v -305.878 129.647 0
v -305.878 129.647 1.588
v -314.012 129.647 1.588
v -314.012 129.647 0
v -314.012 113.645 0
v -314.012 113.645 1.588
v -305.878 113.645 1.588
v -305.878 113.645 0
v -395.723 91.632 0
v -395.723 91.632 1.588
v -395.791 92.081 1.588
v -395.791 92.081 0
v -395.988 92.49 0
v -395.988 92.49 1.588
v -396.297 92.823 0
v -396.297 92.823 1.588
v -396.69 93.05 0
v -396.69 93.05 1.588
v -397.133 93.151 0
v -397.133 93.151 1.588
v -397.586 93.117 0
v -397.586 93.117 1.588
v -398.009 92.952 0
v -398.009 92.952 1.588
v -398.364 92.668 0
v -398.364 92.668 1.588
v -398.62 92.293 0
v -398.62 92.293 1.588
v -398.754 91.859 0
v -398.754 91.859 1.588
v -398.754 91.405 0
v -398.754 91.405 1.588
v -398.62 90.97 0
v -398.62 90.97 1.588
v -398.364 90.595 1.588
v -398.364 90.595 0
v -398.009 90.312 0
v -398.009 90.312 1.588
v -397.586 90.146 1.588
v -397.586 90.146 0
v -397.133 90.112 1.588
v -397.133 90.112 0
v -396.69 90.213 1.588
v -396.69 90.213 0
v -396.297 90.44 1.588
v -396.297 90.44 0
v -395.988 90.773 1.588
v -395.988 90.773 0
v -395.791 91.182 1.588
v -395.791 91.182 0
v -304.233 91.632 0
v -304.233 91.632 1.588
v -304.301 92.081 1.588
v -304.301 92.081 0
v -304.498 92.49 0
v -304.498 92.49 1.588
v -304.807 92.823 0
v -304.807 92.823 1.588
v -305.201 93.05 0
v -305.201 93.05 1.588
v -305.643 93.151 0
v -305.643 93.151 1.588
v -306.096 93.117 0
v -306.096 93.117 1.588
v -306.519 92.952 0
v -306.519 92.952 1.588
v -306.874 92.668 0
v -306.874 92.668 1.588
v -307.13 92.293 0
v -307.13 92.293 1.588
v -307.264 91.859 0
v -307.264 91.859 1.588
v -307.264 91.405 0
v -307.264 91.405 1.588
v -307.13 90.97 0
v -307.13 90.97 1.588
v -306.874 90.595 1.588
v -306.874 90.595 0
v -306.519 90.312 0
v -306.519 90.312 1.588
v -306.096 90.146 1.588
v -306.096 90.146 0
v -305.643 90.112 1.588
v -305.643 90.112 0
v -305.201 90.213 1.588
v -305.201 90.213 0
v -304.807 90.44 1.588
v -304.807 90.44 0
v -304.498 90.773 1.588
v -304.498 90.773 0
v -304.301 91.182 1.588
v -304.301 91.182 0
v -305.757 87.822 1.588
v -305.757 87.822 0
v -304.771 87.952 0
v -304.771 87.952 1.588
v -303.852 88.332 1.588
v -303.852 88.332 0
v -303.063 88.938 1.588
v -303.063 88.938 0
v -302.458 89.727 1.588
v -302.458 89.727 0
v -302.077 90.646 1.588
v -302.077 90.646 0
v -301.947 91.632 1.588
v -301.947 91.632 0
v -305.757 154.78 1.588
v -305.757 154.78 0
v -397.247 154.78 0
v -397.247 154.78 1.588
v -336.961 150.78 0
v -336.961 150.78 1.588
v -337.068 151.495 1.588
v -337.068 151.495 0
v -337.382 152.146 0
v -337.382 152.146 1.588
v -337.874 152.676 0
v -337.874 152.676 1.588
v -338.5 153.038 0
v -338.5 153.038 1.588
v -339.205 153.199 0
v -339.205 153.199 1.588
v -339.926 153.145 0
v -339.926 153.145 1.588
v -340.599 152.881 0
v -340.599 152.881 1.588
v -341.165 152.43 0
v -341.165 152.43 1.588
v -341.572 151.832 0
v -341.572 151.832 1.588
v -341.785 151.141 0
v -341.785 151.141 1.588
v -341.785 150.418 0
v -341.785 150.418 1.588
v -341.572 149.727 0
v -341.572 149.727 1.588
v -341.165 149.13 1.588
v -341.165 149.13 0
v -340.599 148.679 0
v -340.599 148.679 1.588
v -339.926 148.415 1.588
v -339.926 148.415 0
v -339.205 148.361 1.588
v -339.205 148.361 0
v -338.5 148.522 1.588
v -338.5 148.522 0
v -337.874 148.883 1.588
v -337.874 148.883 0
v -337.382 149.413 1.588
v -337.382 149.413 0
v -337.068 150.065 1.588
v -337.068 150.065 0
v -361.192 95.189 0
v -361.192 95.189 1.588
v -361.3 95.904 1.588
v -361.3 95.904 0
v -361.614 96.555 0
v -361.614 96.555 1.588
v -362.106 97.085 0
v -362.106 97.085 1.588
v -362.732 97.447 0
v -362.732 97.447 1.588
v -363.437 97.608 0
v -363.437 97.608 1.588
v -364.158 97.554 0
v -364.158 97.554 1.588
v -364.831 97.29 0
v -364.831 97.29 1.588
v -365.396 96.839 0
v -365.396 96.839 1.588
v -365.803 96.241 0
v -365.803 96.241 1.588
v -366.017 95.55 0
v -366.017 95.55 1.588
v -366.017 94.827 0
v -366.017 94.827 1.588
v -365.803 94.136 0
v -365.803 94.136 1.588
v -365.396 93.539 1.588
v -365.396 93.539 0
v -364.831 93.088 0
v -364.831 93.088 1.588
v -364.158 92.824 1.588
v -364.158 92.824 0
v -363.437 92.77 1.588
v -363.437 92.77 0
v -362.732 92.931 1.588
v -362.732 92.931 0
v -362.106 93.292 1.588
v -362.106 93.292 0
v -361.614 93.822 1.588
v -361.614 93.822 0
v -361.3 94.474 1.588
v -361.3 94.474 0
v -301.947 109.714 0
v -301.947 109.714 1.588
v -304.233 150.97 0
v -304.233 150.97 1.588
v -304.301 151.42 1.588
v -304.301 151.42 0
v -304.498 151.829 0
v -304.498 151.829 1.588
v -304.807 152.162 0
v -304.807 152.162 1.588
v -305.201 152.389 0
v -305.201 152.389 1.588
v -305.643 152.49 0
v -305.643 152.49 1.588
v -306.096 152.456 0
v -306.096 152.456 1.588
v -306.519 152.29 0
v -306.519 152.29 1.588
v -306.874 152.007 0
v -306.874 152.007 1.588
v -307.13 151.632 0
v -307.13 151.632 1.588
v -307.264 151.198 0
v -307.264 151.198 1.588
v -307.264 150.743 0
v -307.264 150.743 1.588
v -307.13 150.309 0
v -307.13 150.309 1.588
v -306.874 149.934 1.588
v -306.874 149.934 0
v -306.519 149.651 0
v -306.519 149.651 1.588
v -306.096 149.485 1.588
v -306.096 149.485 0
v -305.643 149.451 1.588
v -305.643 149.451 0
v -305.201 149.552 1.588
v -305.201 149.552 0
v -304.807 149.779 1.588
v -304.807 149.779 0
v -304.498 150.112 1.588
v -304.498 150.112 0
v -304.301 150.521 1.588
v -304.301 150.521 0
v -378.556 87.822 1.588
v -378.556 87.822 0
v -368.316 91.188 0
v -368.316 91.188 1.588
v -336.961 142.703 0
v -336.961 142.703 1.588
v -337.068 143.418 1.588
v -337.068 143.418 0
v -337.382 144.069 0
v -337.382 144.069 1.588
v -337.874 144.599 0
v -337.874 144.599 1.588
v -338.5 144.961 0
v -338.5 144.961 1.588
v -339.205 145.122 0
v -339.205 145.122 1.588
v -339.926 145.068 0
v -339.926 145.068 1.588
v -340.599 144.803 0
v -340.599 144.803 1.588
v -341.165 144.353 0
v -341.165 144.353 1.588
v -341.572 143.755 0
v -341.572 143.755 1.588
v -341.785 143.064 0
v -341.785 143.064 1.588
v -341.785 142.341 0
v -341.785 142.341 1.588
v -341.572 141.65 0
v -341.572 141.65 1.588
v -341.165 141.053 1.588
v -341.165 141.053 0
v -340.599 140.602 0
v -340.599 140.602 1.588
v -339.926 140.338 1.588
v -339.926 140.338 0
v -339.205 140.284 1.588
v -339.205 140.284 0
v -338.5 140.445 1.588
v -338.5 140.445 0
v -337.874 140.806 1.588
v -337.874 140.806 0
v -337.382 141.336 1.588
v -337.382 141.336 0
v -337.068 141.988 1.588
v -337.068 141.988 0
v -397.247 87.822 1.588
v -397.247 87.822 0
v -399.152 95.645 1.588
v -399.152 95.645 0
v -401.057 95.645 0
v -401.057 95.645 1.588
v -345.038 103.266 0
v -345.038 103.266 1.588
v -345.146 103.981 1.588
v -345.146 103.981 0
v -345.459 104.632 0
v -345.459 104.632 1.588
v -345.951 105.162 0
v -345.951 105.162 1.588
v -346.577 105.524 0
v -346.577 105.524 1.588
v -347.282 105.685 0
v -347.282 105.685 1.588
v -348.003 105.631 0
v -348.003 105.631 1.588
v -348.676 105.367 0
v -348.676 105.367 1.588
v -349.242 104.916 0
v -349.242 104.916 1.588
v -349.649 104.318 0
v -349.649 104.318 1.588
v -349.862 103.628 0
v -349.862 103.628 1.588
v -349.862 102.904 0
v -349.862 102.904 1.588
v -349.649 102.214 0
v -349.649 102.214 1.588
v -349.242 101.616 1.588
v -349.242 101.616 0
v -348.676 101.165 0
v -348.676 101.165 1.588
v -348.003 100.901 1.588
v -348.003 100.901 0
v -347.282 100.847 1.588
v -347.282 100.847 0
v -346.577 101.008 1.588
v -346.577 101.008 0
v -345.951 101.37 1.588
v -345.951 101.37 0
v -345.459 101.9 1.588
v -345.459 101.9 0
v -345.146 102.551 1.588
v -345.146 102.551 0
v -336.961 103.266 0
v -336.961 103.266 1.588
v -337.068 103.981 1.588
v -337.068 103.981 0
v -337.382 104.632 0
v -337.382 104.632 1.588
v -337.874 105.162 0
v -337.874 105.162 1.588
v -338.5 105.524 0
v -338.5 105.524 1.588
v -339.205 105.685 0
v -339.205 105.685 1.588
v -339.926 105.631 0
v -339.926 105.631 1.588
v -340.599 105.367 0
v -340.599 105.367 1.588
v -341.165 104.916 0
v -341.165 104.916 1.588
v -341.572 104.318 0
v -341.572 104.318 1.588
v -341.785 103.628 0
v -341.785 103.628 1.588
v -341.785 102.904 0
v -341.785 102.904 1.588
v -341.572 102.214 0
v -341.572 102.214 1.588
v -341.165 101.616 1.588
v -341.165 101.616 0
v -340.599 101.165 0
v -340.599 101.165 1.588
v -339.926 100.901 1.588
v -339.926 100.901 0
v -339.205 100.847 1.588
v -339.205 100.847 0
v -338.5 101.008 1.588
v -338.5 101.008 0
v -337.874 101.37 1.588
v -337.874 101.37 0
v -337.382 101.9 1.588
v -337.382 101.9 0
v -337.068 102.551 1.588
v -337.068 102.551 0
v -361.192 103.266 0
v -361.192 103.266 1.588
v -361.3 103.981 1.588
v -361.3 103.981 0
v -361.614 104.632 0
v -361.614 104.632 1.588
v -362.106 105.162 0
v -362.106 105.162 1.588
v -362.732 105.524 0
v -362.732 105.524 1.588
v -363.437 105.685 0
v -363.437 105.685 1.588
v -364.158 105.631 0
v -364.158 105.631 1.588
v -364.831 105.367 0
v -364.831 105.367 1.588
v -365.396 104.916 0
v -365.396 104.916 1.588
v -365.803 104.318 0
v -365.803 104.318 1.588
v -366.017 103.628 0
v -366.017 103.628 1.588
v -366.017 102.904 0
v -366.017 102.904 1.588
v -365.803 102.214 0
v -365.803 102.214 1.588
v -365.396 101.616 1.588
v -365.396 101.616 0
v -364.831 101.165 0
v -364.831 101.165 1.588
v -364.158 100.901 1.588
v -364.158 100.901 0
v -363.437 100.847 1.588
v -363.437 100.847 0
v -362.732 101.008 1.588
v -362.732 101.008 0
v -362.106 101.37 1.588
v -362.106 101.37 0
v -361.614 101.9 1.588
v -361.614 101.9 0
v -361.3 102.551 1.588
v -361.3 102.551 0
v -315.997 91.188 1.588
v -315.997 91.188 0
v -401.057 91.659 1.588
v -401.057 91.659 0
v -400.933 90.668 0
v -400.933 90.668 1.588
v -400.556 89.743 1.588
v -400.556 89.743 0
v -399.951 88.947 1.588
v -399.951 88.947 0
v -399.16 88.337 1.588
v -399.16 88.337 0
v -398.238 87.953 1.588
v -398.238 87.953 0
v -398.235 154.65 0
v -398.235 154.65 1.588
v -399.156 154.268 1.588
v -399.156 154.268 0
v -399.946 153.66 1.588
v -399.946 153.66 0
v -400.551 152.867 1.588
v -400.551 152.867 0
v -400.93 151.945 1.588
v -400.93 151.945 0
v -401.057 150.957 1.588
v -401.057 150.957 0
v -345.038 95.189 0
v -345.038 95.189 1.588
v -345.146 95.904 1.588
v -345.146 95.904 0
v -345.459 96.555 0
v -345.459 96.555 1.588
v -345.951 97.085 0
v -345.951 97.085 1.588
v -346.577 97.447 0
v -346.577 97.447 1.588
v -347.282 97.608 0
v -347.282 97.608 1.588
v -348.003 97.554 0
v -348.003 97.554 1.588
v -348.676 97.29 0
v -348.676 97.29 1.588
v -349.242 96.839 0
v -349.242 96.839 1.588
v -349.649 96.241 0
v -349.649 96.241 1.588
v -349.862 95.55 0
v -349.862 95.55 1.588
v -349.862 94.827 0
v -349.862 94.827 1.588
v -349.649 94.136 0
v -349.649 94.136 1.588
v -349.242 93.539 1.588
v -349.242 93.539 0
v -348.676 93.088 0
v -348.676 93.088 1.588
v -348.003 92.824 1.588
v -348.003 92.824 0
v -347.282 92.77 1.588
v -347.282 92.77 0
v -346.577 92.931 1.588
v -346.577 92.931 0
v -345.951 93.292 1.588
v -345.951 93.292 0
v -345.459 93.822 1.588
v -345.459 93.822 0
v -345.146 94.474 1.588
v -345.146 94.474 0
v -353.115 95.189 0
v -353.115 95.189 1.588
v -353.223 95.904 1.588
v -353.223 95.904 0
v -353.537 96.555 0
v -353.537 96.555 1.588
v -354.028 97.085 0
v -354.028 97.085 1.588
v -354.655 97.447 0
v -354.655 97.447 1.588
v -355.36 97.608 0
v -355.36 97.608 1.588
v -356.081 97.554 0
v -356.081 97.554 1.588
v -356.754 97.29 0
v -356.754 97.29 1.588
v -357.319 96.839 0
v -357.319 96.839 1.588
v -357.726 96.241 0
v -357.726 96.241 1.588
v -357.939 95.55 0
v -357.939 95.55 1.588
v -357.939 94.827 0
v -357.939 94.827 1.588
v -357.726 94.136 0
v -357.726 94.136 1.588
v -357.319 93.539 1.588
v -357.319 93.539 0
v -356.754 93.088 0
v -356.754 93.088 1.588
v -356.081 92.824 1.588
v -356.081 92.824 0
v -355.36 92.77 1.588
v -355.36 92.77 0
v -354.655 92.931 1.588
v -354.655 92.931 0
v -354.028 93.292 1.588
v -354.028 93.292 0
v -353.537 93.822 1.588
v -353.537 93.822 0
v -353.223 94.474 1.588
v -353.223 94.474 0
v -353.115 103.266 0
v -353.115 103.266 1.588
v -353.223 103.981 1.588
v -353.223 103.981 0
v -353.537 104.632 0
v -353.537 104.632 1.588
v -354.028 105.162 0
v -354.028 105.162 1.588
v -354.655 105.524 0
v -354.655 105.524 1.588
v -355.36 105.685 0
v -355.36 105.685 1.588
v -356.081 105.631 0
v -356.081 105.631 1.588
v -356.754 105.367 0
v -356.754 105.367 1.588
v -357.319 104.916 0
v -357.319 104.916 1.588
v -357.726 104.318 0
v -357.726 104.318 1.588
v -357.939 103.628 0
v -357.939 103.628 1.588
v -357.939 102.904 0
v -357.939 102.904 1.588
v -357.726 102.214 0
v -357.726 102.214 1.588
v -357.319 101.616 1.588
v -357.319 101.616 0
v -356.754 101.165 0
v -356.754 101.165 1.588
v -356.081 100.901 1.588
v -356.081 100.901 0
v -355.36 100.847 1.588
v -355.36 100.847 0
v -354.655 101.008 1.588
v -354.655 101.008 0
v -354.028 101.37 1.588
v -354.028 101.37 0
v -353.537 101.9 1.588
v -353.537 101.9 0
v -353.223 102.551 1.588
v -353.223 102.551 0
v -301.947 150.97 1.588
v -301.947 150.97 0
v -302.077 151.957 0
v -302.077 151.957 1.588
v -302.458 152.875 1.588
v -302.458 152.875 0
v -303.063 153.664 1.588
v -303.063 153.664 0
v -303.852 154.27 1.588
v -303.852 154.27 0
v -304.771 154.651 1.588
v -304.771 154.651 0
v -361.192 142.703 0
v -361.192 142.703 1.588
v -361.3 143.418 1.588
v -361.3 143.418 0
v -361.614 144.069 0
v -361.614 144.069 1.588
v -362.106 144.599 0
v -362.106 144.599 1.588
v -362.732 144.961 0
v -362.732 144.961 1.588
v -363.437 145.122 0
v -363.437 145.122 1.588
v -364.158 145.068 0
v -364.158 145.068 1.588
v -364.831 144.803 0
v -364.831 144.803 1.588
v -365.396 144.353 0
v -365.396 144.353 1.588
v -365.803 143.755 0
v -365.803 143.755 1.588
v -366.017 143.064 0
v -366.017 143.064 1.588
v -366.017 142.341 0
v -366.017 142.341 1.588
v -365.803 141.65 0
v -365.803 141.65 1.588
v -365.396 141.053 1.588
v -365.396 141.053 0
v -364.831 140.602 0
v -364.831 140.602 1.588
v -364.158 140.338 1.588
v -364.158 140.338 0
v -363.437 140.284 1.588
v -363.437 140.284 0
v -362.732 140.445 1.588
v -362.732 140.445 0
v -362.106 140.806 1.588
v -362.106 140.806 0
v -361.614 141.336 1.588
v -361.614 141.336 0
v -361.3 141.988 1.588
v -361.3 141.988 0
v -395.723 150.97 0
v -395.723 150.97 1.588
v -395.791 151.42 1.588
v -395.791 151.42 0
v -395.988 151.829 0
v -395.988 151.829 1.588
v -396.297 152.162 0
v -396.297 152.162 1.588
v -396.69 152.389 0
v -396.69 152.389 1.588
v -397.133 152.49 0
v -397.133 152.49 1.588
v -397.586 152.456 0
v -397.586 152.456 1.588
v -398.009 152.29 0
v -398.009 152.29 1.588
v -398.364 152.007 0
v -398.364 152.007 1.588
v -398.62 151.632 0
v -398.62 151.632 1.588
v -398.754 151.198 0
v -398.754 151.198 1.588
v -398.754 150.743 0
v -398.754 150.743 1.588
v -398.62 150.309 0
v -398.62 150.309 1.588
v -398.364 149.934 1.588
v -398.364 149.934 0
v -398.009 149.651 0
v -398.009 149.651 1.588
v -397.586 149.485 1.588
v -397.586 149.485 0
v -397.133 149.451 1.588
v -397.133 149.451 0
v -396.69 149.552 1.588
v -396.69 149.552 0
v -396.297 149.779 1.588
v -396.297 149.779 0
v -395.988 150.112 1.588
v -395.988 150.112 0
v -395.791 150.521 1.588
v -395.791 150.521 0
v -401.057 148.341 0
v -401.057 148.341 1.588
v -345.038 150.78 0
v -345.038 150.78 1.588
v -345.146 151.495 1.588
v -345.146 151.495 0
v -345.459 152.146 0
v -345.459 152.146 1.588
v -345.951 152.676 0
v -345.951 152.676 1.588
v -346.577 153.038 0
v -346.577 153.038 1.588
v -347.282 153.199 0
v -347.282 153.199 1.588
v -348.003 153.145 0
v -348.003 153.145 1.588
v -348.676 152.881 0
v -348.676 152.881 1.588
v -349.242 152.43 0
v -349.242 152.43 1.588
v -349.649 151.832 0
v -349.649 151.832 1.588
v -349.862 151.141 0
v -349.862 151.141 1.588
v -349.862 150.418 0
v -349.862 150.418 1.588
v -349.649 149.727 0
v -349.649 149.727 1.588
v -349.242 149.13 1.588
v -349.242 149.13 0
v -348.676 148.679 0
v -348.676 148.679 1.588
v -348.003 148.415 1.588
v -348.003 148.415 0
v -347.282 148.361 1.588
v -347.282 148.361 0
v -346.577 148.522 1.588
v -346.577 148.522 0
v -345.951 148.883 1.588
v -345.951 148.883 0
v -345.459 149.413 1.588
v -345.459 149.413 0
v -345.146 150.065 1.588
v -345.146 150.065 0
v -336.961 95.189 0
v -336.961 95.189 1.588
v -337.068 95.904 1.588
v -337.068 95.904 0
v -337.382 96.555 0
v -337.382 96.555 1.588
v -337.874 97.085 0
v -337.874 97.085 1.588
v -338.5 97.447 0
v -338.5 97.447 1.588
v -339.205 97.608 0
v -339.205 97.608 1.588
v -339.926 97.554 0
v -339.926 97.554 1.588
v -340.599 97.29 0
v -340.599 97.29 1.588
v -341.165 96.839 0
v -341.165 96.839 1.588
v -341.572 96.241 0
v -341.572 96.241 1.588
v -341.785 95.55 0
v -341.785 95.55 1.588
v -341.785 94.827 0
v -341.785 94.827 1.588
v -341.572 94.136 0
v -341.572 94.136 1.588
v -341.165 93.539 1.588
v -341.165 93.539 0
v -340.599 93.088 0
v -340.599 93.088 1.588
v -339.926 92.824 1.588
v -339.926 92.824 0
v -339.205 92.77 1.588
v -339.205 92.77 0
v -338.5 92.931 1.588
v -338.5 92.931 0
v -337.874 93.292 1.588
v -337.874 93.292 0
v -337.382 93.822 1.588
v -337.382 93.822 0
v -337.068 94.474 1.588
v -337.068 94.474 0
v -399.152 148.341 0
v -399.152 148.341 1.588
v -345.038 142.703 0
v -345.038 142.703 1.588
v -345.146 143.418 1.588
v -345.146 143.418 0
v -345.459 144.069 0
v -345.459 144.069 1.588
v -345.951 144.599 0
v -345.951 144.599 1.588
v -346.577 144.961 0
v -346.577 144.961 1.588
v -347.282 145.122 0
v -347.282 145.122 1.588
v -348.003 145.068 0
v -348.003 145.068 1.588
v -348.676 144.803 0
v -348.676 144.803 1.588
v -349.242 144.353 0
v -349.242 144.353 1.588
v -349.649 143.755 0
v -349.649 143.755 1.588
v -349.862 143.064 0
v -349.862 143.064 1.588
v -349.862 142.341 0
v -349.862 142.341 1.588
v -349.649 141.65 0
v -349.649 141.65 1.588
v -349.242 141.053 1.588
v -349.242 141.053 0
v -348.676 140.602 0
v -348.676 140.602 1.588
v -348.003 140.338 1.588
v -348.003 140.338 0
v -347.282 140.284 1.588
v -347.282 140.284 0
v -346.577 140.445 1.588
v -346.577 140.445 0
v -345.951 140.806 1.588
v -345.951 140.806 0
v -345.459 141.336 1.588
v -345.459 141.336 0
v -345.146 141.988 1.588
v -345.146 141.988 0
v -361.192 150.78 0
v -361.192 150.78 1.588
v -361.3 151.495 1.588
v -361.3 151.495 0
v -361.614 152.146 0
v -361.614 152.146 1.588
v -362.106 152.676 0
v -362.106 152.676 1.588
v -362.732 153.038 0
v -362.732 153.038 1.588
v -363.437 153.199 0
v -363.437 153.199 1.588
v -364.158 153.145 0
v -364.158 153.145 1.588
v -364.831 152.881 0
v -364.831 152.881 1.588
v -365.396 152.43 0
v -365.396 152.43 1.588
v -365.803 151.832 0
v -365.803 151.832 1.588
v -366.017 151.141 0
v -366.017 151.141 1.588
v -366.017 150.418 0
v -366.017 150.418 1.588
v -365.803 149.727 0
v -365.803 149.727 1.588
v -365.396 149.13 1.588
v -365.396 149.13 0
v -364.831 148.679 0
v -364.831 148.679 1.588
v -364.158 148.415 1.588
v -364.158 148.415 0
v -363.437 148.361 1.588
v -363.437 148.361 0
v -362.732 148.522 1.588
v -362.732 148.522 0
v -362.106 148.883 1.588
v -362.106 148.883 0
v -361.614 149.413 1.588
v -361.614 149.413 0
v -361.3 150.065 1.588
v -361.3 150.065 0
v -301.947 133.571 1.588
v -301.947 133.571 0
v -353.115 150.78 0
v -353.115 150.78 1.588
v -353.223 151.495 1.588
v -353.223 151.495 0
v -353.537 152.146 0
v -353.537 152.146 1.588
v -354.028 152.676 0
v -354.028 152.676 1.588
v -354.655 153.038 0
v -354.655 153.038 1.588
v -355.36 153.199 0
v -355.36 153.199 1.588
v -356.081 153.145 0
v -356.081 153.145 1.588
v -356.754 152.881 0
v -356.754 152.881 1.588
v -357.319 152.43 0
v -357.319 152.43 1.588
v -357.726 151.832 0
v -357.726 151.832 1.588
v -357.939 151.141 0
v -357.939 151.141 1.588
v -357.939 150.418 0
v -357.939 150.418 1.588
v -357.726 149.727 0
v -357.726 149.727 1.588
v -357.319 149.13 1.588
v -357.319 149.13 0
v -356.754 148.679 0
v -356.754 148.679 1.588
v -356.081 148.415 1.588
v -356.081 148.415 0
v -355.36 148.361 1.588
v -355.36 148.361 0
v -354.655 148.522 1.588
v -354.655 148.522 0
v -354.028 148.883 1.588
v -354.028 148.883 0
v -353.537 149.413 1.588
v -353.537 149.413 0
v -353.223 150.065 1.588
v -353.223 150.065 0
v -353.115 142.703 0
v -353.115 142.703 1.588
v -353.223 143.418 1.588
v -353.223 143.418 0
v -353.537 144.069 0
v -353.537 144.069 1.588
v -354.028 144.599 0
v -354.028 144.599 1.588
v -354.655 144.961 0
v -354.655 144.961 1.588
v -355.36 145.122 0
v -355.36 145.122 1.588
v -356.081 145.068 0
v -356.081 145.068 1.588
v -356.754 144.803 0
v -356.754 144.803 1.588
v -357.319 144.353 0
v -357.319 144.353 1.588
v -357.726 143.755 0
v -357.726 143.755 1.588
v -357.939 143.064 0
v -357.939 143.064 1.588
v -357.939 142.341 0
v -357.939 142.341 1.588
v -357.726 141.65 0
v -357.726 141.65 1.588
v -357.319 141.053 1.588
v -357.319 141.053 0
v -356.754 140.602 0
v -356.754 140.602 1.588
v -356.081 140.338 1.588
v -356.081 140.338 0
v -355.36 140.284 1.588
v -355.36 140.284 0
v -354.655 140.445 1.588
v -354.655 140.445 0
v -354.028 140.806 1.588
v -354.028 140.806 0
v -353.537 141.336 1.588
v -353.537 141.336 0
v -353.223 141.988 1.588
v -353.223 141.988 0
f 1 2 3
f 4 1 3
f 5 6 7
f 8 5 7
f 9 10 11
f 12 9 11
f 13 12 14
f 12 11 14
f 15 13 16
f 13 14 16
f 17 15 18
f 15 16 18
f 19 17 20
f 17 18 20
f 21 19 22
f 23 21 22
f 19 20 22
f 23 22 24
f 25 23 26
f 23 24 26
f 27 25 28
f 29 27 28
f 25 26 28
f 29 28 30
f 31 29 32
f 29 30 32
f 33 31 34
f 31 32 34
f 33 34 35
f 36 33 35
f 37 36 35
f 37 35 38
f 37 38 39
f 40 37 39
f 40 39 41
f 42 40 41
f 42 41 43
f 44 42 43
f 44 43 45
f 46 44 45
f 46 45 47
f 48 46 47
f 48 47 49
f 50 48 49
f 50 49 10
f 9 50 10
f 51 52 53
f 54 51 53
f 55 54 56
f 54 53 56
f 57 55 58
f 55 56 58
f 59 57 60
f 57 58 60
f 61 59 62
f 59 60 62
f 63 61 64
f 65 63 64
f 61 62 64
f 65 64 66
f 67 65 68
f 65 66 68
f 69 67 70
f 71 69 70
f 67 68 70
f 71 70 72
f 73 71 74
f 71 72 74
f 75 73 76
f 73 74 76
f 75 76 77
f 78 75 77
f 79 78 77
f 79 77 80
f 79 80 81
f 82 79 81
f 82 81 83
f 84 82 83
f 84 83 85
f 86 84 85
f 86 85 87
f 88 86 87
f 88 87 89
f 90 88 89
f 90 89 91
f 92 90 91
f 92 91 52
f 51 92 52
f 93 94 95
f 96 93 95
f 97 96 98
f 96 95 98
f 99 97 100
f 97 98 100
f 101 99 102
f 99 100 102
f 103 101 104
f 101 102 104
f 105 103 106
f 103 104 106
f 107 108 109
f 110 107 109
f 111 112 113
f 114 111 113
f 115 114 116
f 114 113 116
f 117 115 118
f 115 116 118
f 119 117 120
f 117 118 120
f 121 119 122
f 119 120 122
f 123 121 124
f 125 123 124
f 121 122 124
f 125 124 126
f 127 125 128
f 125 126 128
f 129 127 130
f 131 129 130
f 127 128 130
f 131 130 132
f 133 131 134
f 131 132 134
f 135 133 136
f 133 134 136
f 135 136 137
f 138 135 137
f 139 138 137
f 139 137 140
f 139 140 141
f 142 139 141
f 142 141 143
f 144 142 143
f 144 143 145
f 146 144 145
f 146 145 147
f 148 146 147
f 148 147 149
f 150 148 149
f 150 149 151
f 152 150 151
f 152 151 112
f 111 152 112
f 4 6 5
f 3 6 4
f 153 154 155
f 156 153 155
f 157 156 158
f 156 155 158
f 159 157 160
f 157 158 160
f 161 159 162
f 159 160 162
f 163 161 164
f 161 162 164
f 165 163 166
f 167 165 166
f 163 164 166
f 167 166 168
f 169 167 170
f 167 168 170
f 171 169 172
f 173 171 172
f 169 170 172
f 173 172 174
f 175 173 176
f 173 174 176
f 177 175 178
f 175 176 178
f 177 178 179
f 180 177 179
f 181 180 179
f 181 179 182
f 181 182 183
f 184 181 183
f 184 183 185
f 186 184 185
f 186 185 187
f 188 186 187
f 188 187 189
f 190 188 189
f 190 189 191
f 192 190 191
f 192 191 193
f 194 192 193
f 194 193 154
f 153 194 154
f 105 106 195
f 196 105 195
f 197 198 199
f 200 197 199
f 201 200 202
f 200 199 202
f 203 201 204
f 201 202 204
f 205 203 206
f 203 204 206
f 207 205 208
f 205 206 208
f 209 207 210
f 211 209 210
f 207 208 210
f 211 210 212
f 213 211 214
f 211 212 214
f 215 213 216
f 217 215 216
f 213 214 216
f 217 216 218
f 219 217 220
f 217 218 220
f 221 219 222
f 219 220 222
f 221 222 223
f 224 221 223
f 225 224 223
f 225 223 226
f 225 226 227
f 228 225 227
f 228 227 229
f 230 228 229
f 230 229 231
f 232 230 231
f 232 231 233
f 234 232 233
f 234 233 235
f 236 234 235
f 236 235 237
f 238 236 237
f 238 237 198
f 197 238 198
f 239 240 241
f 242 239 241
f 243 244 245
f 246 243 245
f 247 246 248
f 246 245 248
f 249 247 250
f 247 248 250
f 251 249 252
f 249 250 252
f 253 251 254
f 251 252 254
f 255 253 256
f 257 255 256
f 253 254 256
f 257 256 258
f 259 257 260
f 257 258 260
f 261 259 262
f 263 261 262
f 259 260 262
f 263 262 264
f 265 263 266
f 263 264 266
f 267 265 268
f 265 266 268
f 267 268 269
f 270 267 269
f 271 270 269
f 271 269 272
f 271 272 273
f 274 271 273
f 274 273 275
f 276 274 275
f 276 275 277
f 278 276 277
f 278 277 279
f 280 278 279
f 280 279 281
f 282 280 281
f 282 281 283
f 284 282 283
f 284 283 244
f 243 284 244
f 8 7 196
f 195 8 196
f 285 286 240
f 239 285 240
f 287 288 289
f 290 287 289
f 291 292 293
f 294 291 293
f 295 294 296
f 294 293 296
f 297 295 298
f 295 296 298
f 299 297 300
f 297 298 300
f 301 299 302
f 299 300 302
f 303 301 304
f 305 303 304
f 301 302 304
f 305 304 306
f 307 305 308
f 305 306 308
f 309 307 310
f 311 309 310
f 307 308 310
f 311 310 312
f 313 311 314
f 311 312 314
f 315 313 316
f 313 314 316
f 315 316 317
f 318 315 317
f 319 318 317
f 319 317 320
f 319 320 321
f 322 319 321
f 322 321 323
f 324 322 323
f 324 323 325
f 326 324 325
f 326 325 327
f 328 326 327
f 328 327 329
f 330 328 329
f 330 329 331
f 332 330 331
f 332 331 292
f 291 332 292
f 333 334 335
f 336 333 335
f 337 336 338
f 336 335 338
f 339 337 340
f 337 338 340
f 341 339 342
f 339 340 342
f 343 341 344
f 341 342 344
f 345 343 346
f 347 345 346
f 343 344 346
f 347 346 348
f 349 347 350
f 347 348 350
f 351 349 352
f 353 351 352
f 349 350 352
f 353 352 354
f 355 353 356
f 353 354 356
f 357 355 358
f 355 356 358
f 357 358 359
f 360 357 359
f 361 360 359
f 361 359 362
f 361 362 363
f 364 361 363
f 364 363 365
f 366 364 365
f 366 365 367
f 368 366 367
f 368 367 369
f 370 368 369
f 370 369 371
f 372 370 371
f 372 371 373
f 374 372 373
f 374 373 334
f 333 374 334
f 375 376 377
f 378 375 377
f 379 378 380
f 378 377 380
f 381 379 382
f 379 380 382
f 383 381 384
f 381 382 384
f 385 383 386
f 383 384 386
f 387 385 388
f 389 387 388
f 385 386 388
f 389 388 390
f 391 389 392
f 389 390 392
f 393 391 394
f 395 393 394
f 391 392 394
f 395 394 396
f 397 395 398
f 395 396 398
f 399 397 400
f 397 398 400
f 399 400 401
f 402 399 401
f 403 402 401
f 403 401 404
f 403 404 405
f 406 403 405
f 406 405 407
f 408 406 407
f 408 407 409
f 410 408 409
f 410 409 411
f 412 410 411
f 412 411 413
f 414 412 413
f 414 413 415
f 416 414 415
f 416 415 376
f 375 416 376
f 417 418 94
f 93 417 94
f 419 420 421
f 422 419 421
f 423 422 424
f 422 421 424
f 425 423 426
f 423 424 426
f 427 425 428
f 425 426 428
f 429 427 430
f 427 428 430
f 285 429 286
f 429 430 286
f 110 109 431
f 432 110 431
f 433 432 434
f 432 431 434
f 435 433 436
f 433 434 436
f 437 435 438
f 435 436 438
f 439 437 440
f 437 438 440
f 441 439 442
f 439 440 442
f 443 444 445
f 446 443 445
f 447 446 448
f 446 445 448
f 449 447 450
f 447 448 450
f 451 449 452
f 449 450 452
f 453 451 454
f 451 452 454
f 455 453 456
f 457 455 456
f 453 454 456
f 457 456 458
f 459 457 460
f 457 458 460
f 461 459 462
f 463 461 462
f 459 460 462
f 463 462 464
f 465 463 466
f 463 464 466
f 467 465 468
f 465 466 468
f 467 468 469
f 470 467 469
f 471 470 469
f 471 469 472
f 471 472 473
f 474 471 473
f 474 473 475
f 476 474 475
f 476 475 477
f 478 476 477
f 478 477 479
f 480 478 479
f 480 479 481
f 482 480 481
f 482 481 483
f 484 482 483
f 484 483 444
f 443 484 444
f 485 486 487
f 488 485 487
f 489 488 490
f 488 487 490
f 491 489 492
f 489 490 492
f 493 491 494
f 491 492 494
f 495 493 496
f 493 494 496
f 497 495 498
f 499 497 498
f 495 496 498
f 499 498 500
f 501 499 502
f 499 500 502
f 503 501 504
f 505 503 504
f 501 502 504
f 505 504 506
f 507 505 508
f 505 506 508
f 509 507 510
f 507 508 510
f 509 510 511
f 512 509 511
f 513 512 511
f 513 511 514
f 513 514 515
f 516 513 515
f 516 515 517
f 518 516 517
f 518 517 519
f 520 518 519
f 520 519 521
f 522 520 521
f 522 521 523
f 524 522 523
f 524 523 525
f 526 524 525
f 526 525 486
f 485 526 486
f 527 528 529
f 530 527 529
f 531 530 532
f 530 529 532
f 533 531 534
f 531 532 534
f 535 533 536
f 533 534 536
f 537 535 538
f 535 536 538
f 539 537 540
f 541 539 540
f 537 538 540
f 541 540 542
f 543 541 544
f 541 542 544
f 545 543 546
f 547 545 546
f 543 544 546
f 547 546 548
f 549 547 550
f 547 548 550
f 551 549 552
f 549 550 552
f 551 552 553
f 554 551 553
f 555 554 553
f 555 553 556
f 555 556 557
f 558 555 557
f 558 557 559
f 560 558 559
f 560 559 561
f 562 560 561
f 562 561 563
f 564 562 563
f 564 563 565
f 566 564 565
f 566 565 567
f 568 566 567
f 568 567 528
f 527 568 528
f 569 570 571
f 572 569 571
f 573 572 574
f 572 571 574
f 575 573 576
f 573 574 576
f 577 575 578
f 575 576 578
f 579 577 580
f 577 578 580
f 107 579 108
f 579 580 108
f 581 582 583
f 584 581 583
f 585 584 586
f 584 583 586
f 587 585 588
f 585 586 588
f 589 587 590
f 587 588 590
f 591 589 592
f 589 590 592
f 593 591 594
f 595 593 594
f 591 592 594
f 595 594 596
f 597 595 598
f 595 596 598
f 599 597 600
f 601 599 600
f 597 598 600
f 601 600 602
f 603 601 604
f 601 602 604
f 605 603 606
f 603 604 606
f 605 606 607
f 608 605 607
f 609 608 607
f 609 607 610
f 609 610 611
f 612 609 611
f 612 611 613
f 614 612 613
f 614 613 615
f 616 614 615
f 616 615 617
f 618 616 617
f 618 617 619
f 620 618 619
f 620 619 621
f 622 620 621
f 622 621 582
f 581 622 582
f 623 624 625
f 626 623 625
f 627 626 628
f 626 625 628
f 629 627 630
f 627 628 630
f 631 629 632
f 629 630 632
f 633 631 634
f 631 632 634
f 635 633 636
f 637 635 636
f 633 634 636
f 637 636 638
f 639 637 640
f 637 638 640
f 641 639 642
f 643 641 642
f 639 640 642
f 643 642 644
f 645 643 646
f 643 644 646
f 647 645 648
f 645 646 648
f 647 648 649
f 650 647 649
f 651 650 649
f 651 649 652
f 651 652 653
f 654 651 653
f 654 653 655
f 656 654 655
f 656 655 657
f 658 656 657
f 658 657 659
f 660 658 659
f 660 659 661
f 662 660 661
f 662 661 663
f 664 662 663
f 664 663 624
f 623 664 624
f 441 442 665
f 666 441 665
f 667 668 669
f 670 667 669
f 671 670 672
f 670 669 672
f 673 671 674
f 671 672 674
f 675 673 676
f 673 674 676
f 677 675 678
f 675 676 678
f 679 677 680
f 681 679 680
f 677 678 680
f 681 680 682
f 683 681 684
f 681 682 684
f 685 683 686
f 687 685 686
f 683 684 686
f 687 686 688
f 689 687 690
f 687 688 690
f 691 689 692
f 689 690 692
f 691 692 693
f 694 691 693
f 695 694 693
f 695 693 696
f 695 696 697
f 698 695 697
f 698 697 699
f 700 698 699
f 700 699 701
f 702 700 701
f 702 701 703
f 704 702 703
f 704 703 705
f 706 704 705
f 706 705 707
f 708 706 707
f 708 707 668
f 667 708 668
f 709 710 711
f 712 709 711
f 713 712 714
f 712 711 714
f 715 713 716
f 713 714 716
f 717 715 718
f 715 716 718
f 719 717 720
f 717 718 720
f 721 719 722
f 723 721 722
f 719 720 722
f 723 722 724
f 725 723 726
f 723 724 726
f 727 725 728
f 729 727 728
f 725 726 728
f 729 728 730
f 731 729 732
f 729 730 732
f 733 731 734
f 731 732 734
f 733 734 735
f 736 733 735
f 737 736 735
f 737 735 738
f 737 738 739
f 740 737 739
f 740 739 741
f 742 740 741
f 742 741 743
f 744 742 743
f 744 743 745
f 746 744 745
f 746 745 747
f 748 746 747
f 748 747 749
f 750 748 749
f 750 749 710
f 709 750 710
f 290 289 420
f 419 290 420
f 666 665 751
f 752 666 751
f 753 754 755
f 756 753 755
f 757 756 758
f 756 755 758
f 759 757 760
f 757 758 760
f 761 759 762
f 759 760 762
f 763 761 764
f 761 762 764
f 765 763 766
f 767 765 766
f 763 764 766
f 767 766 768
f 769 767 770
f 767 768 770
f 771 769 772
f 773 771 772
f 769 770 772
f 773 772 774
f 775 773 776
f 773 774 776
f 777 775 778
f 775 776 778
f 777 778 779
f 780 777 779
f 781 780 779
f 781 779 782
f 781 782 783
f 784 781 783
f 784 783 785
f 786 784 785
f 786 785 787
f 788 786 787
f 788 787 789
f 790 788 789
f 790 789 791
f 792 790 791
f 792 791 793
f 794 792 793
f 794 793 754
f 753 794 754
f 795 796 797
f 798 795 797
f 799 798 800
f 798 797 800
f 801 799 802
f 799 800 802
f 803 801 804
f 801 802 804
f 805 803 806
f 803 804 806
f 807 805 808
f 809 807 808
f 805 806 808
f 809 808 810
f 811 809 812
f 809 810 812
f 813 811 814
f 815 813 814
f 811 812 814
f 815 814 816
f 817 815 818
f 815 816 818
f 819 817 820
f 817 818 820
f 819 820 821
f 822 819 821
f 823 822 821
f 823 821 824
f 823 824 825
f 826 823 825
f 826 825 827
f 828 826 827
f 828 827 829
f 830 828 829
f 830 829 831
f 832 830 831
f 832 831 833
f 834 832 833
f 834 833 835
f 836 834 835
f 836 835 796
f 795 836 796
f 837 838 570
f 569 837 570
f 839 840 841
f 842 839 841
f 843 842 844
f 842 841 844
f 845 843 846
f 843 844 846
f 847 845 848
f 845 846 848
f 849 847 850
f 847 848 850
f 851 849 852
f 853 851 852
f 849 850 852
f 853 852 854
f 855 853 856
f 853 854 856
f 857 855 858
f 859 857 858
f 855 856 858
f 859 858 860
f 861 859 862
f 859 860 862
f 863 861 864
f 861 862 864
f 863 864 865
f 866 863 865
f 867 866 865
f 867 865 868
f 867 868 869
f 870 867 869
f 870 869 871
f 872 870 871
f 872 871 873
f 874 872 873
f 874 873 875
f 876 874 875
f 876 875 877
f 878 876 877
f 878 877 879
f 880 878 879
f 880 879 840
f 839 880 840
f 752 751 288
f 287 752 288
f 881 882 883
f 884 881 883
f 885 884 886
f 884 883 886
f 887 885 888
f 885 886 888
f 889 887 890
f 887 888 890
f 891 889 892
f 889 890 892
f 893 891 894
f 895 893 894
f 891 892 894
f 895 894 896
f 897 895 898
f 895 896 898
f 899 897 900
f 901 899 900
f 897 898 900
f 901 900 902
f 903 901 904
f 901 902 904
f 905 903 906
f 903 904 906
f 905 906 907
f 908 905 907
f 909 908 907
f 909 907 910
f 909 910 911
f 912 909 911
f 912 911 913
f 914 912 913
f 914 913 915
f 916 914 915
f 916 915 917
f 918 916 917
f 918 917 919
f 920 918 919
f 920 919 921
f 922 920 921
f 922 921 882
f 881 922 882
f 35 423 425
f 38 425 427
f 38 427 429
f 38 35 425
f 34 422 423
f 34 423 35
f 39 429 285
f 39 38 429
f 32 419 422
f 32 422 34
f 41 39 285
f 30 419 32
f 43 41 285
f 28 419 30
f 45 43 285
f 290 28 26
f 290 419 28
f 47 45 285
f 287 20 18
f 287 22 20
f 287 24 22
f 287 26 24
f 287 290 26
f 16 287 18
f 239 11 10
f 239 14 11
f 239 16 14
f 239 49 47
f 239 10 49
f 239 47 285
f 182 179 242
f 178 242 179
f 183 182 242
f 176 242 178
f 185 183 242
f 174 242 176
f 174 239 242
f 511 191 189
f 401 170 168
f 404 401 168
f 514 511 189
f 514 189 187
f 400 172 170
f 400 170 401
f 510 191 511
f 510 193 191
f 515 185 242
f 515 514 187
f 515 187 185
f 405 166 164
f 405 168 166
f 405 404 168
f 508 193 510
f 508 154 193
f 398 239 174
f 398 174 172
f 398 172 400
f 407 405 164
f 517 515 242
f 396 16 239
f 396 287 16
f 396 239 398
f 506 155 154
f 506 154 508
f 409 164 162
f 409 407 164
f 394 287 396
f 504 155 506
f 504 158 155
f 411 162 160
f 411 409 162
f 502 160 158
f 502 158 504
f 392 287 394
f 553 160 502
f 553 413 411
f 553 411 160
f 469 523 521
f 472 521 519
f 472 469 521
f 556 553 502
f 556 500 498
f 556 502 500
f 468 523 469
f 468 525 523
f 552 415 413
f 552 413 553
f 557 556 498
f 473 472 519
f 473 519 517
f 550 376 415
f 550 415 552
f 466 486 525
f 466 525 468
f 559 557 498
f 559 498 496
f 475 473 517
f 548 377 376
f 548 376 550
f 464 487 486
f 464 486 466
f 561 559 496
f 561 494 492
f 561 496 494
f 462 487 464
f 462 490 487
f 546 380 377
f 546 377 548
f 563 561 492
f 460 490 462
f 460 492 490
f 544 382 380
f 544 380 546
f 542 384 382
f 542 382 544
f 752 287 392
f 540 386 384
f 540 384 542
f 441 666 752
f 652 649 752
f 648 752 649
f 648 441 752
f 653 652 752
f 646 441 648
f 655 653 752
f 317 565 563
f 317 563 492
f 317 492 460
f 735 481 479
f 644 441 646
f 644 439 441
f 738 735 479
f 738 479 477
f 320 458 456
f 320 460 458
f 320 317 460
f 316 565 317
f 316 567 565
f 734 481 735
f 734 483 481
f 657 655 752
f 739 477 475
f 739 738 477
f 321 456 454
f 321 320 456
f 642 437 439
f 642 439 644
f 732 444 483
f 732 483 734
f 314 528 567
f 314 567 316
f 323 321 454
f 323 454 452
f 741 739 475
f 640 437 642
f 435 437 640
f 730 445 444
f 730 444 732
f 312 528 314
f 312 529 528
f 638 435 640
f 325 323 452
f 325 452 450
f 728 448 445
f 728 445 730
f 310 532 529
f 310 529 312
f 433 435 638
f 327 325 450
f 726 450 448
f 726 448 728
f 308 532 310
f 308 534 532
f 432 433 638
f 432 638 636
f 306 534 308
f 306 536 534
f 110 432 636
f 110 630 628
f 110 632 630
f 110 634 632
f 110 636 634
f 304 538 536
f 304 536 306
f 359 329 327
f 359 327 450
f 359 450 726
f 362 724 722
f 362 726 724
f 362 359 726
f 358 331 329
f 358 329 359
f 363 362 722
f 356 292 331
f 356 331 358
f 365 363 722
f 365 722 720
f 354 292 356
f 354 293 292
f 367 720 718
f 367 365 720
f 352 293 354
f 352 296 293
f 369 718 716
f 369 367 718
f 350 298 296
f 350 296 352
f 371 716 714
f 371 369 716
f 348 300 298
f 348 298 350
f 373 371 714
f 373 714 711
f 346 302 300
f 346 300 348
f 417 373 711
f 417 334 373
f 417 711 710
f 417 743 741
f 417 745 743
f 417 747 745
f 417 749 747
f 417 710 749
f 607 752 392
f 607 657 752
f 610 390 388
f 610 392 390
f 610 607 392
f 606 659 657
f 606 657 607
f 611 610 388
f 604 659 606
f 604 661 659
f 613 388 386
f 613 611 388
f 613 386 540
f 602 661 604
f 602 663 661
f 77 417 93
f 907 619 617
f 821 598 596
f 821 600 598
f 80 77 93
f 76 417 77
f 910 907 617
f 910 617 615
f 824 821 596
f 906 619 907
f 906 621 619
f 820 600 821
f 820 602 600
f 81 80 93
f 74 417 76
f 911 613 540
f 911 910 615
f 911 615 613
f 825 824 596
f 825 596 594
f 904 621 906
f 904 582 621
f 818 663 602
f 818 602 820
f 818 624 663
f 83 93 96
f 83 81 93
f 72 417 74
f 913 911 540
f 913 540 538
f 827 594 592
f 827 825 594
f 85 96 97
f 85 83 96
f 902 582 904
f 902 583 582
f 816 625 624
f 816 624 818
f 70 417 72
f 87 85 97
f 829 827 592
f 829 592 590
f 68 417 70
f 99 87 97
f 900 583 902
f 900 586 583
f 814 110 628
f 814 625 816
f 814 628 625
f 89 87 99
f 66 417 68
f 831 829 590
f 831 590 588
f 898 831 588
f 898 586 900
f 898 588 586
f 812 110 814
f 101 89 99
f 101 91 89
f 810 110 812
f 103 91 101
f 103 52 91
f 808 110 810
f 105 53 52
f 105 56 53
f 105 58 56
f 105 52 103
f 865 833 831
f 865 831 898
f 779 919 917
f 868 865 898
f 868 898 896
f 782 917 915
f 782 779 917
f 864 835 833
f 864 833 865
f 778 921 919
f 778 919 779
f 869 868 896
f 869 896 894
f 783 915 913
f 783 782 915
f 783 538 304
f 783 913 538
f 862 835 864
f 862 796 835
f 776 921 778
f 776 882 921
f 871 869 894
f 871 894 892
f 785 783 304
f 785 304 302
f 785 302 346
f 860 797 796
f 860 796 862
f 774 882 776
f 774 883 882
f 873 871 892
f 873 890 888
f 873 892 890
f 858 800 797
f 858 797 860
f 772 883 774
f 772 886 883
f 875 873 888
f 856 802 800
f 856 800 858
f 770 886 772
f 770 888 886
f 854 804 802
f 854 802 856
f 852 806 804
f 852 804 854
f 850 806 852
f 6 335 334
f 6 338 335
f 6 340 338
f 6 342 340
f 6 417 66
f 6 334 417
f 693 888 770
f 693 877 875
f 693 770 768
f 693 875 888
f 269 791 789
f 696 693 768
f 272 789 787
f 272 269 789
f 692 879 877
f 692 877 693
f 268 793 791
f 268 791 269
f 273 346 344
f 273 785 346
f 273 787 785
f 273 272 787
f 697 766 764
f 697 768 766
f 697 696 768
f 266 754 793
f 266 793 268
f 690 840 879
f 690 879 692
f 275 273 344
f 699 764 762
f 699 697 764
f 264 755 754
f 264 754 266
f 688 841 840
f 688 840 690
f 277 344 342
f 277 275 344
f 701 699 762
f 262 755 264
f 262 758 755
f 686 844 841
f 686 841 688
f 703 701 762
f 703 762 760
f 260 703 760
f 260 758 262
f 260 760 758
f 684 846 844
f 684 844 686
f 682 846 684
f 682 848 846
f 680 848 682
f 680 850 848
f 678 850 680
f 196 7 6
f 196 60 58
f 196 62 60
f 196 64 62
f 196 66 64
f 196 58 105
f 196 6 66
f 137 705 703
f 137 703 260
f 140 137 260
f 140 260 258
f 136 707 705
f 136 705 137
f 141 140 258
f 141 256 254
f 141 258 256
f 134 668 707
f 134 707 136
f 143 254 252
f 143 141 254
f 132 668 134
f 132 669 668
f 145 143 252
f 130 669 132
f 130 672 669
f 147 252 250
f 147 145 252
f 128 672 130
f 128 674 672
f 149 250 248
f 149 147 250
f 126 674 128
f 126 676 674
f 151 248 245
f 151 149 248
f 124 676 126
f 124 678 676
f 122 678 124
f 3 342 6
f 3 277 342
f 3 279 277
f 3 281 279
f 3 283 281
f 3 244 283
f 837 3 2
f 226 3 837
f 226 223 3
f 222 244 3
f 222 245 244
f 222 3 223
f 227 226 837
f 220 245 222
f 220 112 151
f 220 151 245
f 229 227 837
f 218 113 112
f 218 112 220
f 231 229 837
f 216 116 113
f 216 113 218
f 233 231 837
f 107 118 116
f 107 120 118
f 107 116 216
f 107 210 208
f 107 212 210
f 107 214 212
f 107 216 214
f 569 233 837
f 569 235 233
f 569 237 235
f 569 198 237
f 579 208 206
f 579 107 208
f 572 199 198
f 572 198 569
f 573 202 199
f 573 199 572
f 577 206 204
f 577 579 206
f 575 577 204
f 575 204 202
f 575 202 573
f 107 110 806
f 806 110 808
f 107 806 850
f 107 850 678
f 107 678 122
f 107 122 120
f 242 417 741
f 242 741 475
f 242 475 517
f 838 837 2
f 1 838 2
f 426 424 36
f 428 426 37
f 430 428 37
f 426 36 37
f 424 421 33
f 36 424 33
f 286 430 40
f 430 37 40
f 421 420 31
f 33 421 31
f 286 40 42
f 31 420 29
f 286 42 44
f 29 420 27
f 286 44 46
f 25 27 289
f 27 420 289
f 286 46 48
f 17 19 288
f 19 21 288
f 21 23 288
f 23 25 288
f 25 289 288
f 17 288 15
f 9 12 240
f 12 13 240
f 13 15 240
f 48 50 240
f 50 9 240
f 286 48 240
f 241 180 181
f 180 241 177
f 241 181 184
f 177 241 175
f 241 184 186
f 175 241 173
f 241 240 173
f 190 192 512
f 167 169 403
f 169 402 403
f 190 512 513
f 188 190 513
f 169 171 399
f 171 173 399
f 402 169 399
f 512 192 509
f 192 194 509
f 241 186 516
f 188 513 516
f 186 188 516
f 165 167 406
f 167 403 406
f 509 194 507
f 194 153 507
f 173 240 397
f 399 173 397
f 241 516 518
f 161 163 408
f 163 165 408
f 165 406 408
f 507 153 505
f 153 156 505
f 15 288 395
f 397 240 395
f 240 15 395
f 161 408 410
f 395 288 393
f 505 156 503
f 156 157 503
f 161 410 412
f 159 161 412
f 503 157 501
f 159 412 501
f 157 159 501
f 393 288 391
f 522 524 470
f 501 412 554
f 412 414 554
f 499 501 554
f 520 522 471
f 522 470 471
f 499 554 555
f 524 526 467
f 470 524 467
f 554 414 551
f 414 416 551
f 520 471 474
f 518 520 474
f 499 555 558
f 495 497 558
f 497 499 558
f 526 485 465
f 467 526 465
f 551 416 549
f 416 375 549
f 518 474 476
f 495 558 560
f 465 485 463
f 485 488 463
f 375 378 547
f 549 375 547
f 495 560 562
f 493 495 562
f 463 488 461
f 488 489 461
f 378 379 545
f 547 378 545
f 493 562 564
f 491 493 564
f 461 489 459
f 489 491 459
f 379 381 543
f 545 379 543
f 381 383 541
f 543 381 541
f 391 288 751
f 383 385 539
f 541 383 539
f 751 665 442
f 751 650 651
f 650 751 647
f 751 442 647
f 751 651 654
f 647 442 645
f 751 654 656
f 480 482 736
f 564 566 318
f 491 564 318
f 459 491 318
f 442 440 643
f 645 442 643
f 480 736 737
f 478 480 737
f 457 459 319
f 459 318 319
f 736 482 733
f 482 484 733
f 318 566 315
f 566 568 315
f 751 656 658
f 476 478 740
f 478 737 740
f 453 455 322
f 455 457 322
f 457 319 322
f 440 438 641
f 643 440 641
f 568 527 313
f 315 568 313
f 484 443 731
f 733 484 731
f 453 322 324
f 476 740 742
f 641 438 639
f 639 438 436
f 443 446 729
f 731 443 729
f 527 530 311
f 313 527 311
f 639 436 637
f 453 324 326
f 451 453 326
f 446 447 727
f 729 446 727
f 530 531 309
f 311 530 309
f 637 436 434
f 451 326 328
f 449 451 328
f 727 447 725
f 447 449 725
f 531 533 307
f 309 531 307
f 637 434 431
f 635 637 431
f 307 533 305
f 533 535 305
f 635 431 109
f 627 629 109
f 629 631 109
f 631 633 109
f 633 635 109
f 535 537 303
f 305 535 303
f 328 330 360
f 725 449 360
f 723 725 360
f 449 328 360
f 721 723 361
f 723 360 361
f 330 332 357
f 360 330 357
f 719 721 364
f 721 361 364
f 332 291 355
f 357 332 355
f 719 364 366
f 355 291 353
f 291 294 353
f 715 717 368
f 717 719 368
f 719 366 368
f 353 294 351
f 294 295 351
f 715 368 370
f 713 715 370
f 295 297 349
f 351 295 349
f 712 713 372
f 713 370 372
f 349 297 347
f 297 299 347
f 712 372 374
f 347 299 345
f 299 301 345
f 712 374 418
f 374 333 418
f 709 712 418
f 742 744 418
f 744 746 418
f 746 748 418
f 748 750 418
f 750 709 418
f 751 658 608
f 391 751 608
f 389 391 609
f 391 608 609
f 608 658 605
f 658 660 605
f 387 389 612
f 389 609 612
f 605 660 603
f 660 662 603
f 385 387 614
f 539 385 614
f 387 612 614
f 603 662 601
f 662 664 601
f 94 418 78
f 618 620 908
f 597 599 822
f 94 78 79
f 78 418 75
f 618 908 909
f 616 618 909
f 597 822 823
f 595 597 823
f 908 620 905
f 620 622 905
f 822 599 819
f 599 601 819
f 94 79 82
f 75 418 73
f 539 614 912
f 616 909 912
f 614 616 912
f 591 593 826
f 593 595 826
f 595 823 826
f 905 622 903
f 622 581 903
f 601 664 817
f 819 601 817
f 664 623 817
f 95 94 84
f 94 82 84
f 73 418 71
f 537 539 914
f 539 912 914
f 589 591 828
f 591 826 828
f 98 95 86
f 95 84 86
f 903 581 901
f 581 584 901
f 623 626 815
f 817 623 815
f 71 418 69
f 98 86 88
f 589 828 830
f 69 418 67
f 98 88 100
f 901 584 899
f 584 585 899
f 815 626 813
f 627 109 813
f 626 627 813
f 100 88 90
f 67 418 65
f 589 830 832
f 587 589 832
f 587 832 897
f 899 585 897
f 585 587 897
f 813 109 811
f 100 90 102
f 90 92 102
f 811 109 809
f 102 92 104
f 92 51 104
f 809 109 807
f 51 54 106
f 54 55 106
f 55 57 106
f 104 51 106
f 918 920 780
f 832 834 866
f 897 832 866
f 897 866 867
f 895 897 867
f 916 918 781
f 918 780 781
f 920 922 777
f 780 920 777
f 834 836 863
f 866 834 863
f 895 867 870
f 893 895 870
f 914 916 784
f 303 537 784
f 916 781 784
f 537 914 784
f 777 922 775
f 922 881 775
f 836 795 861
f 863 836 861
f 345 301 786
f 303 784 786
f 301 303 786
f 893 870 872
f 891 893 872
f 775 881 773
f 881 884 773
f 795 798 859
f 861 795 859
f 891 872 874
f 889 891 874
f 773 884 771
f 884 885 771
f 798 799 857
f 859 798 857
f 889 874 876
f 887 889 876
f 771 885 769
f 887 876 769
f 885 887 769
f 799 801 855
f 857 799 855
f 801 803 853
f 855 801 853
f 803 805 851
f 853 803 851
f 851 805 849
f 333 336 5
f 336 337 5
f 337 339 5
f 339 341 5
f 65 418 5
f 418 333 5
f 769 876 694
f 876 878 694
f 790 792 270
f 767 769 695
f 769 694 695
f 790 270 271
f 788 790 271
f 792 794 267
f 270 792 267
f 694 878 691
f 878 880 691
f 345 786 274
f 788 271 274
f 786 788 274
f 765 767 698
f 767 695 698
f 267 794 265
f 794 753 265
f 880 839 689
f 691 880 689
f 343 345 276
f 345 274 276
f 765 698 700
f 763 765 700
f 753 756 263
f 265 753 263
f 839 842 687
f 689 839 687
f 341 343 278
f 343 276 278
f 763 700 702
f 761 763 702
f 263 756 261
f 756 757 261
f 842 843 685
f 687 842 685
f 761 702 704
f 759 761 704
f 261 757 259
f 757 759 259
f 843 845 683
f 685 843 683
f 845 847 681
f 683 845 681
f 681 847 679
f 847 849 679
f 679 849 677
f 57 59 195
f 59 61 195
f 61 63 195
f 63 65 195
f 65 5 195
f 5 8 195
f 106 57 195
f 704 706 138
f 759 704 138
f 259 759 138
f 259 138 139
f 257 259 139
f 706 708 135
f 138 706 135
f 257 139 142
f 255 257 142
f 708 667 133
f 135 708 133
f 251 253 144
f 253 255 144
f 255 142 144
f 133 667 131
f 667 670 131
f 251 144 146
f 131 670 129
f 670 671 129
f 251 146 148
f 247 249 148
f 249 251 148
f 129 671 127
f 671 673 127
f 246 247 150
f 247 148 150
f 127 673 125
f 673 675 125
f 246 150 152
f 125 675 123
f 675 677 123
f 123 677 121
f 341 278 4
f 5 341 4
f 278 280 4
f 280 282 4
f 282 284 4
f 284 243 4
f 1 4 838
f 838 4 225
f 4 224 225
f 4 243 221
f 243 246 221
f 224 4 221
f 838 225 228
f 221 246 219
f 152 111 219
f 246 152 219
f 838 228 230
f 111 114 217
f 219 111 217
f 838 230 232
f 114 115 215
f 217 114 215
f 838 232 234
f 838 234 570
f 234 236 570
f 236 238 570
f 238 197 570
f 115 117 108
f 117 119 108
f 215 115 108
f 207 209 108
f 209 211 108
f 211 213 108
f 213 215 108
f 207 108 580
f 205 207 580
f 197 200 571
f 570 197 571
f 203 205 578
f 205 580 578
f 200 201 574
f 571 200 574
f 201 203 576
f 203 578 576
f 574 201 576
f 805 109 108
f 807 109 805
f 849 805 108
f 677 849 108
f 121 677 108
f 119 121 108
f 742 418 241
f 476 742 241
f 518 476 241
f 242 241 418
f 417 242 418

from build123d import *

# Parameters (mm, degrees)
SKETCH1_R           = 1.355900406
BOSS_EXTRUDE1_DEPTH = 1.5875
SKETCH3_R           = 1.524
CUT_EXTRUDE1_DEPTH  = 2.5875
SKETCH5_W           = 2.0955
SKETCH5_H           = 13.208
BOSS_EXTRUDE3_DEPTH = 1.5875
CUT_EXTRUDE2_DEPTH  = 2.5875
SKETCH8_R           = 2.4257
CUT_EXTRUDE3_DEPTH  = 2.5875


with BuildPart() as part:
    # Sketch1 → Boss-Extrude1 (new body)
    with BuildSketch(Plane.XY):
        with BuildLine():
            Line((-301.9473, 111.74645), (-305.87795, 115.6771))
            Line((-305.87795, 115.6771), (-316.1078, 115.6771))
            Line((-316.1078, 115.6771), (-316.1078, 128.8851))
            Line((-316.1078, 128.8851), (-305.87795, 128.8851))
            Line((-305.87795, 128.8851), (-301.9473, 132.81575))
            Line((-301.9473, 132.81575), (-301.9473, 150.9704))
            ThreePointArc((-301.9473, 150.9704), (-303.063223164, 153.664476836), (-305.7573, 154.7804))
            Line((-305.7573, 154.7804), (-397.247125, 154.7804))
            ThreePointArc((-397.247125, 154.7804), (-399.946077222, 153.659592612), (-401.0571, 150.956597849))
            Line((-401.0571, 150.956597849), (-401.0571, 148.341))
            Line((-401.0571, 148.341), (-399.1521, 148.341))
            Line((-399.1521, 148.341), (-399.1521, 95.6449))
            Line((-399.1521, 95.6449), (-401.0571, 95.6449))
            Line((-401.0571, 95.6449), (-401.0571, 91.659304166))
            ThreePointArc((-401.0571, 91.659304166), (-399.951018769, 88.947400452), (-397.2472, 87.8217))
            Line((-397.2472, 87.8217), (-378.5565, 87.8217))
            Line((-378.5565, 87.8217), (-368.3165, 91.1883))
            Line((-368.3165, 91.1883), (-315.9973, 91.1883))
            Line((-315.9973, 91.1883), (-305.7573, 87.8217))
            ThreePointArc((-305.7573, 87.8217), (-303.063223164, 88.937623164), (-301.9473, 91.6317))
            Line((-301.9473, 91.6317), (-301.9473, 111.74645))
        make_face()
        with Locations((-305.7573, 91.6317)):
            Circle(SKETCH1_R, mode=Mode.SUBTRACT)
        with Locations((-305.7573, 150.9704)):
            Circle(SKETCH1_R, mode=Mode.SUBTRACT)
        with Locations((-397.247125, 150.9704)):
            Circle(SKETCH1_R, mode=Mode.SUBTRACT)
        with Locations((-397.2472, 91.6317)):
            Circle(SKETCH1_R, mode=Mode.SUBTRACT)
    extrude(amount=BOSS_EXTRUDE1_DEPTH)

    # Sketch3 → Cut-Extrude1 (cut, through all)
    with BuildSketch(Plane.XY.offset(1.5875)):
        with Locations((-397.247125, 150.9704)):
            Circle(SKETCH3_R)
        with Locations((-305.7573, 150.9704)):
            Circle(SKETCH3_R)
        with Locations((-305.7573, 91.6317)):
            Circle(SKETCH3_R)
        with Locations((-397.2472, 91.6317)):
            Circle(SKETCH3_R)
    extrude(amount=-CUT_EXTRUDE1_DEPTH, mode=Mode.SUBTRACT)

    # Sketch5 → Boss-Extrude3 (add)
    with BuildSketch(Plane.XY.offset(1.5875)):
        with Locations((-315.06005, 122.2811)):
            Rectangle(SKETCH5_W, SKETCH5_H)
    extrude(amount=-BOSS_EXTRUDE3_DEPTH)

    # Sketch4 → Cut-Extrude2 (cut, through all)
    with BuildSketch(Plane.XY.offset(1.5875)):
        Polygon((-301.9473, 133.571034757), (-305.87795, 129.6471), (-314.0123, 129.6471), (-314.0123, 113.6451), (-305.87795, 113.6451), (-301.9473, 109.71445), align=None)
    extrude(amount=-CUT_EXTRUDE2_DEPTH, mode=Mode.SUBTRACT)

    # Sketch8 → Cut-Extrude3 (cut, through all)
    with BuildSketch(Plane.XY.offset(1.5875)):
        with Locations((-363.6180125, 150.7799)):
            Circle(SKETCH8_R)
        with Locations((-355.5408125, 150.7799)):
            Circle(SKETCH8_R)
        with Locations((-347.4636125, 150.7799)):
            Circle(SKETCH8_R)
        with Locations((-339.3864125, 150.7799)):
            Circle(SKETCH8_R)
        with Locations((-339.3864125, 142.7027)):
            Circle(SKETCH8_R)
        with Locations((-347.4636125, 142.7027)):
            Circle(SKETCH8_R)
        with Locations((-355.5408125, 142.7027)):
            Circle(SKETCH8_R)
        with Locations((-363.6180125, 142.7027)):
            Circle(SKETCH8_R)
        with Locations((-363.6180125, 95.1888)):
            Circle(SKETCH8_R)
        with Locations((-339.3864125, 95.1888)):
            Circle(SKETCH8_R)
        with Locations((-347.4636125, 95.1888)):
            Circle(SKETCH8_R)
        with Locations((-355.5408125, 95.1888)):
            Circle(SKETCH8_R)
        with Locations((-363.6180125, 103.266)):
            Circle(SKETCH8_R)
        with Locations((-355.5408125, 103.266)):
            Circle(SKETCH8_R)
        with Locations((-347.4636125, 103.266)):
            Circle(SKETCH8_R)
        with Locations((-339.3864125, 103.266)):
            Circle(SKETCH8_R)
    extrude(amount=-CUT_EXTRUDE3_DEPTH, mode=Mode.SUBTRACT)


solid = part.part
